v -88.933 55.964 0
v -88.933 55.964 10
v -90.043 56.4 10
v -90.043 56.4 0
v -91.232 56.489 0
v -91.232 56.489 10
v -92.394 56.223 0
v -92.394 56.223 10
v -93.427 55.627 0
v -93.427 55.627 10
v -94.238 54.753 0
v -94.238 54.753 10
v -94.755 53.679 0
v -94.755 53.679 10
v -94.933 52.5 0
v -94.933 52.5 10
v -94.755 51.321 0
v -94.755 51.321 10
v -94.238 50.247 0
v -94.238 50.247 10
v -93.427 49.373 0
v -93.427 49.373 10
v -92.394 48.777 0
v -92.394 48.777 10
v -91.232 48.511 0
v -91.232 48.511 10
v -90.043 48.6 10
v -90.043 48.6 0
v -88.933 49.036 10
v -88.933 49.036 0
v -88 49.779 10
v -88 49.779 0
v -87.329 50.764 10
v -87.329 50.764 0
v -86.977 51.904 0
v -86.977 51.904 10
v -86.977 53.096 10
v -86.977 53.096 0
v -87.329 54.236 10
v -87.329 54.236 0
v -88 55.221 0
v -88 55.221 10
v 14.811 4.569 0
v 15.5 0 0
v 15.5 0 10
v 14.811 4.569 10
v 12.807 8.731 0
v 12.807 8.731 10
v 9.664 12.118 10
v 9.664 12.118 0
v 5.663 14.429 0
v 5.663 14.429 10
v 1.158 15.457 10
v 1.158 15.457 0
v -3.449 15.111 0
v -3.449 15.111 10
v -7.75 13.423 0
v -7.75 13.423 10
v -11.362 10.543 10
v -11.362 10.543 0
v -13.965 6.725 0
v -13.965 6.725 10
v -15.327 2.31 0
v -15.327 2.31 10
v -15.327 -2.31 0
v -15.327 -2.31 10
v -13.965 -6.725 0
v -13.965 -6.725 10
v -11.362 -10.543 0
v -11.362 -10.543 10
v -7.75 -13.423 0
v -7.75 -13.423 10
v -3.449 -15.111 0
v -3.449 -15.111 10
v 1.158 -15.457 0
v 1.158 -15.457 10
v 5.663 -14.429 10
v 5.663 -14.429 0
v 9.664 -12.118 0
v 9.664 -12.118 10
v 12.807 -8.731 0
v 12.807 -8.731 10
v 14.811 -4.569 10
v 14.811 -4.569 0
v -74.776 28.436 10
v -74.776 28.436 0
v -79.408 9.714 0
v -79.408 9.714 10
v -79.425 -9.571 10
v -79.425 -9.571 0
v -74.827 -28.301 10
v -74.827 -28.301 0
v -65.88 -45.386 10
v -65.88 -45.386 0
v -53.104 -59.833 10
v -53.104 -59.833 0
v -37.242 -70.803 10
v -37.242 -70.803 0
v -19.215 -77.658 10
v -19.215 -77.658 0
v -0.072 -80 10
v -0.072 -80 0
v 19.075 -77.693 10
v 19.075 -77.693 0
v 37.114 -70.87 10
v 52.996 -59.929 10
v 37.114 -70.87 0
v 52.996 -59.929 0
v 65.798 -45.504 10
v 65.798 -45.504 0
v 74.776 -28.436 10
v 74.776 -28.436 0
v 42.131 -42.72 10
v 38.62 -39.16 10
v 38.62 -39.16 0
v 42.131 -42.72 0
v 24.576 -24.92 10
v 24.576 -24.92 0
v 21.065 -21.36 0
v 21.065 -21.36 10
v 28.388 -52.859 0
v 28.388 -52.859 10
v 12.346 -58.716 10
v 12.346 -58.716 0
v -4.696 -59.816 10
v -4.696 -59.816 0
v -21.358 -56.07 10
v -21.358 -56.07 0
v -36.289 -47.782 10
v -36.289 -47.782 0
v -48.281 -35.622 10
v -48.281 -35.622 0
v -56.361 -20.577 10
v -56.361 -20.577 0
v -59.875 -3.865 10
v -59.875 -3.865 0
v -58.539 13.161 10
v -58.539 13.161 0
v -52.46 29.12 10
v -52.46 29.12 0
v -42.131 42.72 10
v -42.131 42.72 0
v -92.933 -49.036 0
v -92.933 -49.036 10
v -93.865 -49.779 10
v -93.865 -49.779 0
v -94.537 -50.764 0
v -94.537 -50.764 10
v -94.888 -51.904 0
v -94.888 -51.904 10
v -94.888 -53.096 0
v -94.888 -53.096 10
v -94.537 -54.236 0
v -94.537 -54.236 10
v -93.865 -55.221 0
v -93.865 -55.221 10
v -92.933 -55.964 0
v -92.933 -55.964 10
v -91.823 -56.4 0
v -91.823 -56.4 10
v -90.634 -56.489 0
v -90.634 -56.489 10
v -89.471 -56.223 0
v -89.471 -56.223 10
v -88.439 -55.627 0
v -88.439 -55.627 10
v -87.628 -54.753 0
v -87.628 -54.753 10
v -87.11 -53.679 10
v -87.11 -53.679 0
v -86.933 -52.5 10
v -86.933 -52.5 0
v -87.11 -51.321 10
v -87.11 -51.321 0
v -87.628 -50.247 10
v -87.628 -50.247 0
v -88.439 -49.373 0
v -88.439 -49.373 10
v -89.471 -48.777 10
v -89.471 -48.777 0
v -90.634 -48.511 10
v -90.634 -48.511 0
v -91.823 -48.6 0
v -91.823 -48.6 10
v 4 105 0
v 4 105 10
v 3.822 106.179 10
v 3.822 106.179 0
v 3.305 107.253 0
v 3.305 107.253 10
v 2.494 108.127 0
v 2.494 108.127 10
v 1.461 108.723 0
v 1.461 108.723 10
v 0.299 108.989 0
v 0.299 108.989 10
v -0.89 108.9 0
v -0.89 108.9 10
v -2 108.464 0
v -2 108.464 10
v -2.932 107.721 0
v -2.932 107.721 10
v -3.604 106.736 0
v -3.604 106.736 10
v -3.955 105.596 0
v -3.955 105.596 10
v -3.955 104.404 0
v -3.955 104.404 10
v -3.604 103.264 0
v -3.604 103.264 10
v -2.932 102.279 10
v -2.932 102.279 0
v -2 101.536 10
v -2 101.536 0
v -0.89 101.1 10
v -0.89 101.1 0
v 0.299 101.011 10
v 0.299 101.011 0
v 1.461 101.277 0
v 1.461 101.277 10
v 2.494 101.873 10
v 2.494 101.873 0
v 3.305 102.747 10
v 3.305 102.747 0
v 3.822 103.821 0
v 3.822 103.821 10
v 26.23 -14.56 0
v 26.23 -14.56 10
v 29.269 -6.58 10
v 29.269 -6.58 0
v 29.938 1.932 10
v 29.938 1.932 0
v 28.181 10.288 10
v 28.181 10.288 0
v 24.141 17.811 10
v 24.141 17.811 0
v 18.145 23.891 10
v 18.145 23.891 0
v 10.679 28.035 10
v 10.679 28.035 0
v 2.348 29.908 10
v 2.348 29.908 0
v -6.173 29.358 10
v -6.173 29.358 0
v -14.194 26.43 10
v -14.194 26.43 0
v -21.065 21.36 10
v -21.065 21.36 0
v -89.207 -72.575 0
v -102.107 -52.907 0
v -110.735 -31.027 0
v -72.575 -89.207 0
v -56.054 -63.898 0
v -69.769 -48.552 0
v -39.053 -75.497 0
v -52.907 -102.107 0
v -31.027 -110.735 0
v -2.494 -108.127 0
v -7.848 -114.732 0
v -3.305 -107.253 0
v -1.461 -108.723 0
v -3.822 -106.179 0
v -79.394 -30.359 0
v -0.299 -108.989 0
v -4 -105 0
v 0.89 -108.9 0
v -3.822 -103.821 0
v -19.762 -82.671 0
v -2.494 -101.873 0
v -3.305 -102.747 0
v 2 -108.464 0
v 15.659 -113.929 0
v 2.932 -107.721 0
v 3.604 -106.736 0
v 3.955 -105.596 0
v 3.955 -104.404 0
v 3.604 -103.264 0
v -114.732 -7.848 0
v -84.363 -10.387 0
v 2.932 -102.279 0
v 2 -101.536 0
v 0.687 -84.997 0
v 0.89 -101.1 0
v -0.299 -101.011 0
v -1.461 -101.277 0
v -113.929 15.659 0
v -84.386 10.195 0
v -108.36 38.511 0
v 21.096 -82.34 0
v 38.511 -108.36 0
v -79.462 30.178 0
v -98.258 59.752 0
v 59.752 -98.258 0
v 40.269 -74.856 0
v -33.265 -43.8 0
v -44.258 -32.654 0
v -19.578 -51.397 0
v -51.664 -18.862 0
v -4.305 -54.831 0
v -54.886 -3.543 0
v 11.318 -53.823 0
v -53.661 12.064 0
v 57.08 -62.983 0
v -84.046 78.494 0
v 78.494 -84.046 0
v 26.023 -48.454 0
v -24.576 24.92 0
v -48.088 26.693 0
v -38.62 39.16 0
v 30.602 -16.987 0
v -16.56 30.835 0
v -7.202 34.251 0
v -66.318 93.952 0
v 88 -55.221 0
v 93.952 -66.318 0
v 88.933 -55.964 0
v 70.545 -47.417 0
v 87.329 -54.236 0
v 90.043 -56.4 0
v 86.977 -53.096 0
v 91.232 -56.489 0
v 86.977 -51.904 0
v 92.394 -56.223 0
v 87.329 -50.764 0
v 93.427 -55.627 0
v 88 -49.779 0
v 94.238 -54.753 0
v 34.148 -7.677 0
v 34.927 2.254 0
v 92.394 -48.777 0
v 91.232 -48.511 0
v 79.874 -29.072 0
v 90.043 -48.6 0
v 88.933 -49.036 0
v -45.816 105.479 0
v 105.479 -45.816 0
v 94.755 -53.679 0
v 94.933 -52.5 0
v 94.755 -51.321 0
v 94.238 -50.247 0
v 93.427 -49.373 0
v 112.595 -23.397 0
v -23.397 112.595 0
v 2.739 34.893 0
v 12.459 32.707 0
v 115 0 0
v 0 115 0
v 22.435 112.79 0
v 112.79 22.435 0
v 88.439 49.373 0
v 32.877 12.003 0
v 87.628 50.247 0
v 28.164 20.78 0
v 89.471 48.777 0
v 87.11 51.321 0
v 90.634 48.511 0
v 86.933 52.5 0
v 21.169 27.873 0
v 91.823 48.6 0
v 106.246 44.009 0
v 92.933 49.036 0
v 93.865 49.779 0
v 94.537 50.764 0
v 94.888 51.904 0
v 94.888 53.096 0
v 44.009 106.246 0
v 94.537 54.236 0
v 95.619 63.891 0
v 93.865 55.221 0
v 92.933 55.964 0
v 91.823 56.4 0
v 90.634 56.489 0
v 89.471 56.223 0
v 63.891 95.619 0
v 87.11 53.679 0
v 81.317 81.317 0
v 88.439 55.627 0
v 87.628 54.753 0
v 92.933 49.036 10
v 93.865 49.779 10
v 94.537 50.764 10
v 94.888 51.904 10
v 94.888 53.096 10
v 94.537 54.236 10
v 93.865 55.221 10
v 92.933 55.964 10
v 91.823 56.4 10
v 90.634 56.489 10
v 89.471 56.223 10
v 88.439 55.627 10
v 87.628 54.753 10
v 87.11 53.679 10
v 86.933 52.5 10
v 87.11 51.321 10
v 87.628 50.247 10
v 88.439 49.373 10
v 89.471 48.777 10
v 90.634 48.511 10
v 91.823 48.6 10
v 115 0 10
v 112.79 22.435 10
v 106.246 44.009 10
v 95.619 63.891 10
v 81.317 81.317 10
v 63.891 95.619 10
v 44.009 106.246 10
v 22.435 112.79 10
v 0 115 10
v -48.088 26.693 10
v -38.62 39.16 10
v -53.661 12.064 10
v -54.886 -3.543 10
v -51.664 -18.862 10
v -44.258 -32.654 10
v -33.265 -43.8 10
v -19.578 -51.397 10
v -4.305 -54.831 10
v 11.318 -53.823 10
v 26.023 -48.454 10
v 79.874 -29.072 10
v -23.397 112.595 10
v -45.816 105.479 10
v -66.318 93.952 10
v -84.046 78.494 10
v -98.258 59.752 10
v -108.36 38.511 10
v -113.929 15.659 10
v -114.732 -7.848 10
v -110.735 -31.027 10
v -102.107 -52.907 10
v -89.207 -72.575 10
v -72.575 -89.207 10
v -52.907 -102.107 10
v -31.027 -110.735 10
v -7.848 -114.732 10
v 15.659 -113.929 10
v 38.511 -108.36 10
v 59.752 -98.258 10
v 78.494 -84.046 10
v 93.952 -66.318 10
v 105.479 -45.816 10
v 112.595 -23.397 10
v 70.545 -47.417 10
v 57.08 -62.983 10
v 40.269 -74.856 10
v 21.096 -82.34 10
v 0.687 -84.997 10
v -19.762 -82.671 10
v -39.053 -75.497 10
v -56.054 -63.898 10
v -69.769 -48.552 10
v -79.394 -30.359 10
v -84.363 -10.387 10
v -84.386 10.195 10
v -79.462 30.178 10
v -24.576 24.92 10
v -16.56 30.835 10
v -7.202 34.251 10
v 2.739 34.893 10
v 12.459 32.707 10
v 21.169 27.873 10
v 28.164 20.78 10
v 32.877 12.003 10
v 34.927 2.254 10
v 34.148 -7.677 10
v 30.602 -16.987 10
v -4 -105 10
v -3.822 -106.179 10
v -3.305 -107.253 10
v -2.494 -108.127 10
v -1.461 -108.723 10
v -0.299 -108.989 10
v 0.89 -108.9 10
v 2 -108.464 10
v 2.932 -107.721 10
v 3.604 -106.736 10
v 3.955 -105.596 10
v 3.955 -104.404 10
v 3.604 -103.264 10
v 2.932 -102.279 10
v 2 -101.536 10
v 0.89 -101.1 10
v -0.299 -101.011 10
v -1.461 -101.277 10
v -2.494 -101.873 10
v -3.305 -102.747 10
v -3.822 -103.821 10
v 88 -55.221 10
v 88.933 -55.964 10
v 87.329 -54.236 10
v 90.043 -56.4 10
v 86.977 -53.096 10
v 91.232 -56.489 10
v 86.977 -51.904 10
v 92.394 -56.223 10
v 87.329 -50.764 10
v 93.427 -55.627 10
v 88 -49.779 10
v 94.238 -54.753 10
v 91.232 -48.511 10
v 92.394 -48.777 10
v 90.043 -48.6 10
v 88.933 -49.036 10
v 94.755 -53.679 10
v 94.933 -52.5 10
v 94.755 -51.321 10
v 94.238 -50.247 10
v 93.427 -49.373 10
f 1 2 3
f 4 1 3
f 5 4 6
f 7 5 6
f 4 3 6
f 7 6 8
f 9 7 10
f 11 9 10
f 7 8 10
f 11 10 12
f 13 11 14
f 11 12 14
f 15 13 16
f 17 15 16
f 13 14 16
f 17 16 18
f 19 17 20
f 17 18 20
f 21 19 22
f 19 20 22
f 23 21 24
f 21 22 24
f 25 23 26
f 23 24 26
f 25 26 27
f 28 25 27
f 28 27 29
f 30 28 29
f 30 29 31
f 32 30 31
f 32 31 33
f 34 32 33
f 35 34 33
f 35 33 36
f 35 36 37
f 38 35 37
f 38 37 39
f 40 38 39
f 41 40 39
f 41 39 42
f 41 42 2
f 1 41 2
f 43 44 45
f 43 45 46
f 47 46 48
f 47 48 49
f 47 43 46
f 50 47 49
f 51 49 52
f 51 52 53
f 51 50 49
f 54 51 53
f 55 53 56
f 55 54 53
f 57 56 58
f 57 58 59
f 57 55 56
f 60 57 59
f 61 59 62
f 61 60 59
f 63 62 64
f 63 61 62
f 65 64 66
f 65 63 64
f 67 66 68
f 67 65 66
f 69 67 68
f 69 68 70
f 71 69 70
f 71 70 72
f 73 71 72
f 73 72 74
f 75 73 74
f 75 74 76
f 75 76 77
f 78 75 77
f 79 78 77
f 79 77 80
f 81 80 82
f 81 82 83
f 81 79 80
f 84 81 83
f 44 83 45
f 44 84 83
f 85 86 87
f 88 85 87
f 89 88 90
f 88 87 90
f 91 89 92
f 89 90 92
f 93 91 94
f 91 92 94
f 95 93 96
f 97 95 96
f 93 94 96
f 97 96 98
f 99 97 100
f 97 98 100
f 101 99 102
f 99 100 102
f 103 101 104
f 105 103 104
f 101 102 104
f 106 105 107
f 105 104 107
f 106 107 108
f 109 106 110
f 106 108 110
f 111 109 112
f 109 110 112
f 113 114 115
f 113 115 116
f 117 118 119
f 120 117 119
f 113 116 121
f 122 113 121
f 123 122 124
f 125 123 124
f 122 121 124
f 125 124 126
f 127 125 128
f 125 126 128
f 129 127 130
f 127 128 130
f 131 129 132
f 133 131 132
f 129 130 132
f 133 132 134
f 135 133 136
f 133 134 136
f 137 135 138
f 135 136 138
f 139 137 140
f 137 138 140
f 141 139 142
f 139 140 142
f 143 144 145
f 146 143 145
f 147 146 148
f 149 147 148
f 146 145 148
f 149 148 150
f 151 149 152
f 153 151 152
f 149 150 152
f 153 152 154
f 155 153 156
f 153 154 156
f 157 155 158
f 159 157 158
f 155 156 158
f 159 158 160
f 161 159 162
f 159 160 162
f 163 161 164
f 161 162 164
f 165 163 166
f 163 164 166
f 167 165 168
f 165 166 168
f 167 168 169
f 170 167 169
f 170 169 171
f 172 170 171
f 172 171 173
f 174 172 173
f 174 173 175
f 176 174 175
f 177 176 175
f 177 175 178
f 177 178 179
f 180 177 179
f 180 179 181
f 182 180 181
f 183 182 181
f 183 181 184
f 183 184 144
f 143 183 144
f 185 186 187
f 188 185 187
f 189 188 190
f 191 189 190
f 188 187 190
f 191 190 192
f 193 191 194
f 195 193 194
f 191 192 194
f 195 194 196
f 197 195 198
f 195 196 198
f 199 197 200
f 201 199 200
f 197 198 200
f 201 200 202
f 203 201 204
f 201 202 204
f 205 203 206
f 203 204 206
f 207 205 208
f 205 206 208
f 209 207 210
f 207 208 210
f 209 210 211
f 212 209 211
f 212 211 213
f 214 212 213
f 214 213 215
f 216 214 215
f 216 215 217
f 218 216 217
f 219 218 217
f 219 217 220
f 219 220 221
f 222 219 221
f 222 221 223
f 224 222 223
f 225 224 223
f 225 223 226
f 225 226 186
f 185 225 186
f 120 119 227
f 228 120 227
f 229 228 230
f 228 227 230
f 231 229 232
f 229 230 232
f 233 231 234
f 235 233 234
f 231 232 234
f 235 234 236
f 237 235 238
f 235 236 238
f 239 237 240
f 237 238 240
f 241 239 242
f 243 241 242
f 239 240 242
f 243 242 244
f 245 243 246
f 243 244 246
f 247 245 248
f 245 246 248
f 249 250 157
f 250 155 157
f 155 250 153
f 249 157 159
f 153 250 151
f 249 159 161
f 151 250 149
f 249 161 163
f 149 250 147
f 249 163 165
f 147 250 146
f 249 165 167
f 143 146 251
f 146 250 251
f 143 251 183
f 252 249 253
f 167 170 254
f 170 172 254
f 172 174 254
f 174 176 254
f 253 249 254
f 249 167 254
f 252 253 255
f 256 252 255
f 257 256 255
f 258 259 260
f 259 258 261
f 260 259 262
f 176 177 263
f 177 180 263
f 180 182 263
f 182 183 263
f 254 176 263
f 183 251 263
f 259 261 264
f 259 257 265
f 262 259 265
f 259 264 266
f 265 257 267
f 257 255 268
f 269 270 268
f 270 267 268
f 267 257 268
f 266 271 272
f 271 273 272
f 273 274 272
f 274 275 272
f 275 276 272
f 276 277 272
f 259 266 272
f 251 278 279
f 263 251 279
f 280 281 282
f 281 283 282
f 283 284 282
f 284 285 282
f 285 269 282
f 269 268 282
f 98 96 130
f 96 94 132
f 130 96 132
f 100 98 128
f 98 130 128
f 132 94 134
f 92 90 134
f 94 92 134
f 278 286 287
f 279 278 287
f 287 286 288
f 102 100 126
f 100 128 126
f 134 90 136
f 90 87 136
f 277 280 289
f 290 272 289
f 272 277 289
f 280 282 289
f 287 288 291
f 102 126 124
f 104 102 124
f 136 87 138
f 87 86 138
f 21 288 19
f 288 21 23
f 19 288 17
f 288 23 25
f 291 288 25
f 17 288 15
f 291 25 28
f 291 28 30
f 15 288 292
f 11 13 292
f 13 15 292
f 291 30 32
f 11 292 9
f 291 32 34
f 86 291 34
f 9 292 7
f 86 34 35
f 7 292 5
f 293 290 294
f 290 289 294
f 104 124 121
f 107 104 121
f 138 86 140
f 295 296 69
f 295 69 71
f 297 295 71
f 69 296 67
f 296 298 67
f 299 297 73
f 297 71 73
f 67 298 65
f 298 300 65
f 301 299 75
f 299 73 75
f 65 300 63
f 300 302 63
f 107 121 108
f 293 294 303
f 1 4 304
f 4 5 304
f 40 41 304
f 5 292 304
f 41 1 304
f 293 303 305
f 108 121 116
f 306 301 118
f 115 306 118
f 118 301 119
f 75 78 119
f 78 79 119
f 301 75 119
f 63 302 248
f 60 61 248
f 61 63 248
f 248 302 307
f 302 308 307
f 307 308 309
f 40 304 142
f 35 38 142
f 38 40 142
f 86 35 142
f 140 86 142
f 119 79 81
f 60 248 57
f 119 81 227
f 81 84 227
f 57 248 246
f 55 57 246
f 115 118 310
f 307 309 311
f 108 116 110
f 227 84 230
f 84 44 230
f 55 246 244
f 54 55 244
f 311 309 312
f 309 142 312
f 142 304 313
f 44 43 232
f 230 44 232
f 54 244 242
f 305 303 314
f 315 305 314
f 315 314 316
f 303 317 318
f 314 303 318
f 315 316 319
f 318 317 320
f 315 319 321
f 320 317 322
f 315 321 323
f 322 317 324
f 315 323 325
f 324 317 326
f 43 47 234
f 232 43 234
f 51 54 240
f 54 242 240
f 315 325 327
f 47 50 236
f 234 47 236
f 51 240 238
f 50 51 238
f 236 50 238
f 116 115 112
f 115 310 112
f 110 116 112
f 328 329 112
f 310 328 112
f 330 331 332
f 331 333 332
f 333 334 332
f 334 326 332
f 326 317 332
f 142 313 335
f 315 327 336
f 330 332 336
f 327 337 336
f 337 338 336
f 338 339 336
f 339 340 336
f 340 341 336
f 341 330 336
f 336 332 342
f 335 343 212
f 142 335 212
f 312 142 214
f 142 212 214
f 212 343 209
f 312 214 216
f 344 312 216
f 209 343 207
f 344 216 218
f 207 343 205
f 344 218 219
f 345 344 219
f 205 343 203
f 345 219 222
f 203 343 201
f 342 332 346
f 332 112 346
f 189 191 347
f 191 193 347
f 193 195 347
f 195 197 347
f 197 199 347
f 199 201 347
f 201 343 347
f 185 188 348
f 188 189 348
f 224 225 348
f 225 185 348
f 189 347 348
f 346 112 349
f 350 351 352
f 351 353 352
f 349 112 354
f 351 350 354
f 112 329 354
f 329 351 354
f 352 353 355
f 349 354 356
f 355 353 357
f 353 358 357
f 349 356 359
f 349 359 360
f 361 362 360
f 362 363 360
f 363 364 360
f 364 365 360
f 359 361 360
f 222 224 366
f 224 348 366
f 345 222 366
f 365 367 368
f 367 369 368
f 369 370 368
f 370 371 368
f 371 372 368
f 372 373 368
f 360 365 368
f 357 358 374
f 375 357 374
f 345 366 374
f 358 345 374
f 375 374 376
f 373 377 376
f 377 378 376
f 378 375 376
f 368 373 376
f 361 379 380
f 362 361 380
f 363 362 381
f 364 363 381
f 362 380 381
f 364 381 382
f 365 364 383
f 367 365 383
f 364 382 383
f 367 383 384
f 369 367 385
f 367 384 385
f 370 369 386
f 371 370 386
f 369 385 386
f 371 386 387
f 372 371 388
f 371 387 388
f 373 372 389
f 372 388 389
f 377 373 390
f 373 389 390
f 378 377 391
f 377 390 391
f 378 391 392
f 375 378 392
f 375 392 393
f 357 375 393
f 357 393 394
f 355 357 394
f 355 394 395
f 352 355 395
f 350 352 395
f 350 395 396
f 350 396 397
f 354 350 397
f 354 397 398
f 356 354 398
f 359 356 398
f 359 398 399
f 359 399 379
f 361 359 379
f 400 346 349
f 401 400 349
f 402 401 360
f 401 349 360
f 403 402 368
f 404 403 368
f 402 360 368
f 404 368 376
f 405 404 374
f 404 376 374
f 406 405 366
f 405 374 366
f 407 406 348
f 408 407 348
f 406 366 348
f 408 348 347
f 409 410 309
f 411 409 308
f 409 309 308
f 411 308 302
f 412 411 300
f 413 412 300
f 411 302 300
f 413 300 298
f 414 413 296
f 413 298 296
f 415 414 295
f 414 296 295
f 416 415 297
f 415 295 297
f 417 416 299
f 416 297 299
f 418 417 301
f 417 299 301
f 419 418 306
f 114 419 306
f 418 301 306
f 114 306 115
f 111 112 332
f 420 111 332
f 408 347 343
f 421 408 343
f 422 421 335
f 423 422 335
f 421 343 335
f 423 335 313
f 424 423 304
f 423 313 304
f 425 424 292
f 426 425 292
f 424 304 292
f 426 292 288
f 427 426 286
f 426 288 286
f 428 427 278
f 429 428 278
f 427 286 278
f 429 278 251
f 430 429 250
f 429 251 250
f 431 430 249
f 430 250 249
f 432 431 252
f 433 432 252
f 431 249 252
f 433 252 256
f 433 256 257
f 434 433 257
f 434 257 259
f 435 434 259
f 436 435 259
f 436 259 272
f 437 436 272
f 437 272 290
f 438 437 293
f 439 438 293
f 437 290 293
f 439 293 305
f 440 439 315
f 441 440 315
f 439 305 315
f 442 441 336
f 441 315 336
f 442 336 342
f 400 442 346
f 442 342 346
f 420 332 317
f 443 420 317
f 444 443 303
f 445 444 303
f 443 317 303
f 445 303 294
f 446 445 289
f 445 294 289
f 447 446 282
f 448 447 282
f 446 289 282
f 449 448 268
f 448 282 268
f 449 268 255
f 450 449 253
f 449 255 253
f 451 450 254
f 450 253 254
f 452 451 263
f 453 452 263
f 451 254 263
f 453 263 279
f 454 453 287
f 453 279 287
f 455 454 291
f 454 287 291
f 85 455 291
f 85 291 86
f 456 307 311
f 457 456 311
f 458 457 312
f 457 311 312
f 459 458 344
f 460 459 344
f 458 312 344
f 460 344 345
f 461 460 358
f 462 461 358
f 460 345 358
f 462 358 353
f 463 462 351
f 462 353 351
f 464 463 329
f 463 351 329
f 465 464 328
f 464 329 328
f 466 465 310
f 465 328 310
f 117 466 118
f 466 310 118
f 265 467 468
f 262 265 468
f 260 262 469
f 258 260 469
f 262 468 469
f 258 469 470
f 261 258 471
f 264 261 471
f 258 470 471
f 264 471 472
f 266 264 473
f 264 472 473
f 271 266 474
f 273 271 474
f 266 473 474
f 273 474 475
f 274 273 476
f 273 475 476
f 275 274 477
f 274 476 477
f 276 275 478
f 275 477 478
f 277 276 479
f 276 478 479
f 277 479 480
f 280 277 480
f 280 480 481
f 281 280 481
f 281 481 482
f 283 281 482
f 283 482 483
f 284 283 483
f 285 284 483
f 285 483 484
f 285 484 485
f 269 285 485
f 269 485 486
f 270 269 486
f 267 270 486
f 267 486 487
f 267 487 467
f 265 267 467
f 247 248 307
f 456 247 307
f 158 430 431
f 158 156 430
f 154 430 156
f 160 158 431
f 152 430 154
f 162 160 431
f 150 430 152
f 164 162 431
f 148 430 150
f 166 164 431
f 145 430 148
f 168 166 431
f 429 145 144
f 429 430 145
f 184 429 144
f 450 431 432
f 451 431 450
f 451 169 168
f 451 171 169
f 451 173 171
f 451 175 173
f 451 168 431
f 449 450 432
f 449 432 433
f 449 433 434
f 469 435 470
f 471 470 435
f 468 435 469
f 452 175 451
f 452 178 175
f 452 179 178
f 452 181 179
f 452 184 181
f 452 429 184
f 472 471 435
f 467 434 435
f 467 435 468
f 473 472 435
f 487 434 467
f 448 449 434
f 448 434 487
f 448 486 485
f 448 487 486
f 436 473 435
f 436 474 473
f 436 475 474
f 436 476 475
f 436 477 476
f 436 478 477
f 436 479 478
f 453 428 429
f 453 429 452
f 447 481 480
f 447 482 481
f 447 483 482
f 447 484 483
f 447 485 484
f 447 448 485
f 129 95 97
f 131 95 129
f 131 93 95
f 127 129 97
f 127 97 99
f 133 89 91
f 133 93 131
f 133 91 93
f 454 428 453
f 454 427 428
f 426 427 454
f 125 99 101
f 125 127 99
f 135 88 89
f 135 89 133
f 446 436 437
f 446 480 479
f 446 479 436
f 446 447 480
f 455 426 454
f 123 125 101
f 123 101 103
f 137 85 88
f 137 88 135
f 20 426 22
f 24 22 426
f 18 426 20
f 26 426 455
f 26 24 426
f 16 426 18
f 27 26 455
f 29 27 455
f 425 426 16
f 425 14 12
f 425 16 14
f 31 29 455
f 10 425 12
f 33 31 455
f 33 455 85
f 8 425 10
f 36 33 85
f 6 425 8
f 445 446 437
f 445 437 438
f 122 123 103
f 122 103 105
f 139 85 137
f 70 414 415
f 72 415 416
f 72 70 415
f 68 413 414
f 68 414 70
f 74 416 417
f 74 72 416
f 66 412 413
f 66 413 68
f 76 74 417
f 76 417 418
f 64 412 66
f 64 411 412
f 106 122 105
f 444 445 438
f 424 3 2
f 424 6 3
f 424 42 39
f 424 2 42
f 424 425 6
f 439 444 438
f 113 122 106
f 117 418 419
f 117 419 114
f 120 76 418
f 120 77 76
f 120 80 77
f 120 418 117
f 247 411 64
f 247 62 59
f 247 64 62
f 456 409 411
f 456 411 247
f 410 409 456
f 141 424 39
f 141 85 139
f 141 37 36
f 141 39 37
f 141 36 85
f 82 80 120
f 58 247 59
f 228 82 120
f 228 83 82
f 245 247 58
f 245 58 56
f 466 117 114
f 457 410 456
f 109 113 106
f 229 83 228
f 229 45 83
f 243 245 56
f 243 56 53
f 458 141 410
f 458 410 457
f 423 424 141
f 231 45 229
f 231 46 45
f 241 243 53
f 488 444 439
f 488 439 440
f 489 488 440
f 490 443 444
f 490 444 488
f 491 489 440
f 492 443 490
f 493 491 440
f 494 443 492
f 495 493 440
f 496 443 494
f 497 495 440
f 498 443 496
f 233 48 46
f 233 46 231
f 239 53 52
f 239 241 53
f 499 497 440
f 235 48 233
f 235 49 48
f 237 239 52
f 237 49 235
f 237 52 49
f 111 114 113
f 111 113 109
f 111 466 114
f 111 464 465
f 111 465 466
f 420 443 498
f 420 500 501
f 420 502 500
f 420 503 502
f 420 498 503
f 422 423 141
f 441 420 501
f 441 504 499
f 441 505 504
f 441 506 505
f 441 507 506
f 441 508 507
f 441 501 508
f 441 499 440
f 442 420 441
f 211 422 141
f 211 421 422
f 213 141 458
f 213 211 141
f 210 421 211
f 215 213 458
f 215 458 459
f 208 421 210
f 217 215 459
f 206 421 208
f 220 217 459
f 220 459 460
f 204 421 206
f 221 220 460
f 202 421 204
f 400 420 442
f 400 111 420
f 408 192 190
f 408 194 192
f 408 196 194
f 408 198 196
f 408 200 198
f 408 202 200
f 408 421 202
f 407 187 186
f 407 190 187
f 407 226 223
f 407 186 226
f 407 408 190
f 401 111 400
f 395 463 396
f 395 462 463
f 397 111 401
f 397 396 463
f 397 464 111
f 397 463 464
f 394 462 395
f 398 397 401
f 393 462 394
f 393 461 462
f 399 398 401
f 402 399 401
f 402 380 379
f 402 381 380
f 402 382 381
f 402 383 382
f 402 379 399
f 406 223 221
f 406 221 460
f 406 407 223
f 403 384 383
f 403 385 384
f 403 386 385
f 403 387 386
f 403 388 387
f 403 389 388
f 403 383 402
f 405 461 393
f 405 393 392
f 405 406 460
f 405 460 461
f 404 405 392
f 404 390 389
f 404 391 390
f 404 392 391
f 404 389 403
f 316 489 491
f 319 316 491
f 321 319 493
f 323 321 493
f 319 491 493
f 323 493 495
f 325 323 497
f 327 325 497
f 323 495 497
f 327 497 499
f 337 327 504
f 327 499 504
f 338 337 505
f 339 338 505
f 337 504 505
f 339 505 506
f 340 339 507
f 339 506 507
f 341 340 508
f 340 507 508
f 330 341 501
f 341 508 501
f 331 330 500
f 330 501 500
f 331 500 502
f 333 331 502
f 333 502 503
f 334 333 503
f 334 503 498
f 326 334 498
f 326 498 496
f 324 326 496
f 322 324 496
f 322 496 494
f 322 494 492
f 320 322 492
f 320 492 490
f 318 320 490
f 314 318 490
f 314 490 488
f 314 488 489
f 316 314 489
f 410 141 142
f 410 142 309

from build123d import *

# Parameters (mm, degrees)
F0_R            = 15.5
F1_DEPTH        = 10
F2_R            = 4
F3_DEPTH        = 25
F3_COPIES_COUNT = 6


# Not quite as in the source:
# - a pattern or mirror of a feature is missing from the dataset's text; its kind, count and spacing are read off the source's solid


with BuildPart() as f1:
    # F0 (on Top) → F1 (new body)
    with BuildSketch(Plane.XY):
        with BuildLine():
            ThreePointArc((115, 0), (81.3172798365, 81.3172798365), (0, 115))
            ThreePointArc((0, 115), (-81.3172798365, -81.3172798365), (115, 0))
        make_face()
        with BuildLine():
            ThreePointArc((79.8738727668, -29.0717121827), (-29.6258097027, -79.6700156863), (-79.4623147975, 30.1784778779))
            Line((-79.4623147975, 30.1784778779), (-74.7757231643, 28.4357385213))
            ThreePointArc((-74.7757231643, 28.4357385213), (-28.4357385213, -74.7757231643), (74.7757231643, -28.4357385213))
            Line((74.7757231643, -28.4357385213), (79.8738727668, -29.0717121827))
        make_face(mode=Mode.SUBTRACT)
        with BuildLine():
            Line((-42.1306922898, 42.7200745222), (-38.6198012657, 39.160068312))
            ThreePointArc((-38.6198012657, 39.160068312), (-39.160068312, -38.6198012657), (38.6198012657, -39.160068312))
            Line((38.6198012657, -39.160068312), (42.1306922898, -42.7200745222))
            ThreePointArc((42.1306922898, -42.7200745222), (-42.7200745222, -42.1306922898), (-42.1306922898, 42.7200745222))
        make_face(mode=Mode.SUBTRACT)
        Circle(F0_R, mode=Mode.SUBTRACT)
        with BuildLine():
            ThreePointArc((-24.5762371691, 24.9200434713), (24.9200434713, 24.5762371691), (24.5762371691, -24.9200434713))
            Line((24.5762371691, -24.9200434713), (21.0653461449, -21.3600372611))
            ThreePointArc((21.0653461449, -21.3600372611), (21.3600372611, 21.0653461449), (-21.0653461449, 21.3600372611))
            Line((-21.0653461449, 21.3600372611), (-24.5762371691, 24.9200434713))
        make_face(mode=Mode.SUBTRACT)
    extrude(amount=F1_DEPTH)

    # F2 (on face) → F3 (cut)
    with BuildSketch(Plane.XY.offset(10)):
        with Locations((0, 105)):
            Circle(F2_R)
    f3 = extrude(amount=-F3_DEPTH, mode=Mode.SUBTRACT)

    # F3_copies: F3 ×6 about axis
    f3_copies_axis = Axis((0, 0, 0), (0, 0, 1))
    for i in range(1, F3_COPIES_COUNT):
        add(f3.rotate(f3_copies_axis, i * 360 / F3_COPIES_COUNT), mode=Mode.SUBTRACT)


solid = f1.part
